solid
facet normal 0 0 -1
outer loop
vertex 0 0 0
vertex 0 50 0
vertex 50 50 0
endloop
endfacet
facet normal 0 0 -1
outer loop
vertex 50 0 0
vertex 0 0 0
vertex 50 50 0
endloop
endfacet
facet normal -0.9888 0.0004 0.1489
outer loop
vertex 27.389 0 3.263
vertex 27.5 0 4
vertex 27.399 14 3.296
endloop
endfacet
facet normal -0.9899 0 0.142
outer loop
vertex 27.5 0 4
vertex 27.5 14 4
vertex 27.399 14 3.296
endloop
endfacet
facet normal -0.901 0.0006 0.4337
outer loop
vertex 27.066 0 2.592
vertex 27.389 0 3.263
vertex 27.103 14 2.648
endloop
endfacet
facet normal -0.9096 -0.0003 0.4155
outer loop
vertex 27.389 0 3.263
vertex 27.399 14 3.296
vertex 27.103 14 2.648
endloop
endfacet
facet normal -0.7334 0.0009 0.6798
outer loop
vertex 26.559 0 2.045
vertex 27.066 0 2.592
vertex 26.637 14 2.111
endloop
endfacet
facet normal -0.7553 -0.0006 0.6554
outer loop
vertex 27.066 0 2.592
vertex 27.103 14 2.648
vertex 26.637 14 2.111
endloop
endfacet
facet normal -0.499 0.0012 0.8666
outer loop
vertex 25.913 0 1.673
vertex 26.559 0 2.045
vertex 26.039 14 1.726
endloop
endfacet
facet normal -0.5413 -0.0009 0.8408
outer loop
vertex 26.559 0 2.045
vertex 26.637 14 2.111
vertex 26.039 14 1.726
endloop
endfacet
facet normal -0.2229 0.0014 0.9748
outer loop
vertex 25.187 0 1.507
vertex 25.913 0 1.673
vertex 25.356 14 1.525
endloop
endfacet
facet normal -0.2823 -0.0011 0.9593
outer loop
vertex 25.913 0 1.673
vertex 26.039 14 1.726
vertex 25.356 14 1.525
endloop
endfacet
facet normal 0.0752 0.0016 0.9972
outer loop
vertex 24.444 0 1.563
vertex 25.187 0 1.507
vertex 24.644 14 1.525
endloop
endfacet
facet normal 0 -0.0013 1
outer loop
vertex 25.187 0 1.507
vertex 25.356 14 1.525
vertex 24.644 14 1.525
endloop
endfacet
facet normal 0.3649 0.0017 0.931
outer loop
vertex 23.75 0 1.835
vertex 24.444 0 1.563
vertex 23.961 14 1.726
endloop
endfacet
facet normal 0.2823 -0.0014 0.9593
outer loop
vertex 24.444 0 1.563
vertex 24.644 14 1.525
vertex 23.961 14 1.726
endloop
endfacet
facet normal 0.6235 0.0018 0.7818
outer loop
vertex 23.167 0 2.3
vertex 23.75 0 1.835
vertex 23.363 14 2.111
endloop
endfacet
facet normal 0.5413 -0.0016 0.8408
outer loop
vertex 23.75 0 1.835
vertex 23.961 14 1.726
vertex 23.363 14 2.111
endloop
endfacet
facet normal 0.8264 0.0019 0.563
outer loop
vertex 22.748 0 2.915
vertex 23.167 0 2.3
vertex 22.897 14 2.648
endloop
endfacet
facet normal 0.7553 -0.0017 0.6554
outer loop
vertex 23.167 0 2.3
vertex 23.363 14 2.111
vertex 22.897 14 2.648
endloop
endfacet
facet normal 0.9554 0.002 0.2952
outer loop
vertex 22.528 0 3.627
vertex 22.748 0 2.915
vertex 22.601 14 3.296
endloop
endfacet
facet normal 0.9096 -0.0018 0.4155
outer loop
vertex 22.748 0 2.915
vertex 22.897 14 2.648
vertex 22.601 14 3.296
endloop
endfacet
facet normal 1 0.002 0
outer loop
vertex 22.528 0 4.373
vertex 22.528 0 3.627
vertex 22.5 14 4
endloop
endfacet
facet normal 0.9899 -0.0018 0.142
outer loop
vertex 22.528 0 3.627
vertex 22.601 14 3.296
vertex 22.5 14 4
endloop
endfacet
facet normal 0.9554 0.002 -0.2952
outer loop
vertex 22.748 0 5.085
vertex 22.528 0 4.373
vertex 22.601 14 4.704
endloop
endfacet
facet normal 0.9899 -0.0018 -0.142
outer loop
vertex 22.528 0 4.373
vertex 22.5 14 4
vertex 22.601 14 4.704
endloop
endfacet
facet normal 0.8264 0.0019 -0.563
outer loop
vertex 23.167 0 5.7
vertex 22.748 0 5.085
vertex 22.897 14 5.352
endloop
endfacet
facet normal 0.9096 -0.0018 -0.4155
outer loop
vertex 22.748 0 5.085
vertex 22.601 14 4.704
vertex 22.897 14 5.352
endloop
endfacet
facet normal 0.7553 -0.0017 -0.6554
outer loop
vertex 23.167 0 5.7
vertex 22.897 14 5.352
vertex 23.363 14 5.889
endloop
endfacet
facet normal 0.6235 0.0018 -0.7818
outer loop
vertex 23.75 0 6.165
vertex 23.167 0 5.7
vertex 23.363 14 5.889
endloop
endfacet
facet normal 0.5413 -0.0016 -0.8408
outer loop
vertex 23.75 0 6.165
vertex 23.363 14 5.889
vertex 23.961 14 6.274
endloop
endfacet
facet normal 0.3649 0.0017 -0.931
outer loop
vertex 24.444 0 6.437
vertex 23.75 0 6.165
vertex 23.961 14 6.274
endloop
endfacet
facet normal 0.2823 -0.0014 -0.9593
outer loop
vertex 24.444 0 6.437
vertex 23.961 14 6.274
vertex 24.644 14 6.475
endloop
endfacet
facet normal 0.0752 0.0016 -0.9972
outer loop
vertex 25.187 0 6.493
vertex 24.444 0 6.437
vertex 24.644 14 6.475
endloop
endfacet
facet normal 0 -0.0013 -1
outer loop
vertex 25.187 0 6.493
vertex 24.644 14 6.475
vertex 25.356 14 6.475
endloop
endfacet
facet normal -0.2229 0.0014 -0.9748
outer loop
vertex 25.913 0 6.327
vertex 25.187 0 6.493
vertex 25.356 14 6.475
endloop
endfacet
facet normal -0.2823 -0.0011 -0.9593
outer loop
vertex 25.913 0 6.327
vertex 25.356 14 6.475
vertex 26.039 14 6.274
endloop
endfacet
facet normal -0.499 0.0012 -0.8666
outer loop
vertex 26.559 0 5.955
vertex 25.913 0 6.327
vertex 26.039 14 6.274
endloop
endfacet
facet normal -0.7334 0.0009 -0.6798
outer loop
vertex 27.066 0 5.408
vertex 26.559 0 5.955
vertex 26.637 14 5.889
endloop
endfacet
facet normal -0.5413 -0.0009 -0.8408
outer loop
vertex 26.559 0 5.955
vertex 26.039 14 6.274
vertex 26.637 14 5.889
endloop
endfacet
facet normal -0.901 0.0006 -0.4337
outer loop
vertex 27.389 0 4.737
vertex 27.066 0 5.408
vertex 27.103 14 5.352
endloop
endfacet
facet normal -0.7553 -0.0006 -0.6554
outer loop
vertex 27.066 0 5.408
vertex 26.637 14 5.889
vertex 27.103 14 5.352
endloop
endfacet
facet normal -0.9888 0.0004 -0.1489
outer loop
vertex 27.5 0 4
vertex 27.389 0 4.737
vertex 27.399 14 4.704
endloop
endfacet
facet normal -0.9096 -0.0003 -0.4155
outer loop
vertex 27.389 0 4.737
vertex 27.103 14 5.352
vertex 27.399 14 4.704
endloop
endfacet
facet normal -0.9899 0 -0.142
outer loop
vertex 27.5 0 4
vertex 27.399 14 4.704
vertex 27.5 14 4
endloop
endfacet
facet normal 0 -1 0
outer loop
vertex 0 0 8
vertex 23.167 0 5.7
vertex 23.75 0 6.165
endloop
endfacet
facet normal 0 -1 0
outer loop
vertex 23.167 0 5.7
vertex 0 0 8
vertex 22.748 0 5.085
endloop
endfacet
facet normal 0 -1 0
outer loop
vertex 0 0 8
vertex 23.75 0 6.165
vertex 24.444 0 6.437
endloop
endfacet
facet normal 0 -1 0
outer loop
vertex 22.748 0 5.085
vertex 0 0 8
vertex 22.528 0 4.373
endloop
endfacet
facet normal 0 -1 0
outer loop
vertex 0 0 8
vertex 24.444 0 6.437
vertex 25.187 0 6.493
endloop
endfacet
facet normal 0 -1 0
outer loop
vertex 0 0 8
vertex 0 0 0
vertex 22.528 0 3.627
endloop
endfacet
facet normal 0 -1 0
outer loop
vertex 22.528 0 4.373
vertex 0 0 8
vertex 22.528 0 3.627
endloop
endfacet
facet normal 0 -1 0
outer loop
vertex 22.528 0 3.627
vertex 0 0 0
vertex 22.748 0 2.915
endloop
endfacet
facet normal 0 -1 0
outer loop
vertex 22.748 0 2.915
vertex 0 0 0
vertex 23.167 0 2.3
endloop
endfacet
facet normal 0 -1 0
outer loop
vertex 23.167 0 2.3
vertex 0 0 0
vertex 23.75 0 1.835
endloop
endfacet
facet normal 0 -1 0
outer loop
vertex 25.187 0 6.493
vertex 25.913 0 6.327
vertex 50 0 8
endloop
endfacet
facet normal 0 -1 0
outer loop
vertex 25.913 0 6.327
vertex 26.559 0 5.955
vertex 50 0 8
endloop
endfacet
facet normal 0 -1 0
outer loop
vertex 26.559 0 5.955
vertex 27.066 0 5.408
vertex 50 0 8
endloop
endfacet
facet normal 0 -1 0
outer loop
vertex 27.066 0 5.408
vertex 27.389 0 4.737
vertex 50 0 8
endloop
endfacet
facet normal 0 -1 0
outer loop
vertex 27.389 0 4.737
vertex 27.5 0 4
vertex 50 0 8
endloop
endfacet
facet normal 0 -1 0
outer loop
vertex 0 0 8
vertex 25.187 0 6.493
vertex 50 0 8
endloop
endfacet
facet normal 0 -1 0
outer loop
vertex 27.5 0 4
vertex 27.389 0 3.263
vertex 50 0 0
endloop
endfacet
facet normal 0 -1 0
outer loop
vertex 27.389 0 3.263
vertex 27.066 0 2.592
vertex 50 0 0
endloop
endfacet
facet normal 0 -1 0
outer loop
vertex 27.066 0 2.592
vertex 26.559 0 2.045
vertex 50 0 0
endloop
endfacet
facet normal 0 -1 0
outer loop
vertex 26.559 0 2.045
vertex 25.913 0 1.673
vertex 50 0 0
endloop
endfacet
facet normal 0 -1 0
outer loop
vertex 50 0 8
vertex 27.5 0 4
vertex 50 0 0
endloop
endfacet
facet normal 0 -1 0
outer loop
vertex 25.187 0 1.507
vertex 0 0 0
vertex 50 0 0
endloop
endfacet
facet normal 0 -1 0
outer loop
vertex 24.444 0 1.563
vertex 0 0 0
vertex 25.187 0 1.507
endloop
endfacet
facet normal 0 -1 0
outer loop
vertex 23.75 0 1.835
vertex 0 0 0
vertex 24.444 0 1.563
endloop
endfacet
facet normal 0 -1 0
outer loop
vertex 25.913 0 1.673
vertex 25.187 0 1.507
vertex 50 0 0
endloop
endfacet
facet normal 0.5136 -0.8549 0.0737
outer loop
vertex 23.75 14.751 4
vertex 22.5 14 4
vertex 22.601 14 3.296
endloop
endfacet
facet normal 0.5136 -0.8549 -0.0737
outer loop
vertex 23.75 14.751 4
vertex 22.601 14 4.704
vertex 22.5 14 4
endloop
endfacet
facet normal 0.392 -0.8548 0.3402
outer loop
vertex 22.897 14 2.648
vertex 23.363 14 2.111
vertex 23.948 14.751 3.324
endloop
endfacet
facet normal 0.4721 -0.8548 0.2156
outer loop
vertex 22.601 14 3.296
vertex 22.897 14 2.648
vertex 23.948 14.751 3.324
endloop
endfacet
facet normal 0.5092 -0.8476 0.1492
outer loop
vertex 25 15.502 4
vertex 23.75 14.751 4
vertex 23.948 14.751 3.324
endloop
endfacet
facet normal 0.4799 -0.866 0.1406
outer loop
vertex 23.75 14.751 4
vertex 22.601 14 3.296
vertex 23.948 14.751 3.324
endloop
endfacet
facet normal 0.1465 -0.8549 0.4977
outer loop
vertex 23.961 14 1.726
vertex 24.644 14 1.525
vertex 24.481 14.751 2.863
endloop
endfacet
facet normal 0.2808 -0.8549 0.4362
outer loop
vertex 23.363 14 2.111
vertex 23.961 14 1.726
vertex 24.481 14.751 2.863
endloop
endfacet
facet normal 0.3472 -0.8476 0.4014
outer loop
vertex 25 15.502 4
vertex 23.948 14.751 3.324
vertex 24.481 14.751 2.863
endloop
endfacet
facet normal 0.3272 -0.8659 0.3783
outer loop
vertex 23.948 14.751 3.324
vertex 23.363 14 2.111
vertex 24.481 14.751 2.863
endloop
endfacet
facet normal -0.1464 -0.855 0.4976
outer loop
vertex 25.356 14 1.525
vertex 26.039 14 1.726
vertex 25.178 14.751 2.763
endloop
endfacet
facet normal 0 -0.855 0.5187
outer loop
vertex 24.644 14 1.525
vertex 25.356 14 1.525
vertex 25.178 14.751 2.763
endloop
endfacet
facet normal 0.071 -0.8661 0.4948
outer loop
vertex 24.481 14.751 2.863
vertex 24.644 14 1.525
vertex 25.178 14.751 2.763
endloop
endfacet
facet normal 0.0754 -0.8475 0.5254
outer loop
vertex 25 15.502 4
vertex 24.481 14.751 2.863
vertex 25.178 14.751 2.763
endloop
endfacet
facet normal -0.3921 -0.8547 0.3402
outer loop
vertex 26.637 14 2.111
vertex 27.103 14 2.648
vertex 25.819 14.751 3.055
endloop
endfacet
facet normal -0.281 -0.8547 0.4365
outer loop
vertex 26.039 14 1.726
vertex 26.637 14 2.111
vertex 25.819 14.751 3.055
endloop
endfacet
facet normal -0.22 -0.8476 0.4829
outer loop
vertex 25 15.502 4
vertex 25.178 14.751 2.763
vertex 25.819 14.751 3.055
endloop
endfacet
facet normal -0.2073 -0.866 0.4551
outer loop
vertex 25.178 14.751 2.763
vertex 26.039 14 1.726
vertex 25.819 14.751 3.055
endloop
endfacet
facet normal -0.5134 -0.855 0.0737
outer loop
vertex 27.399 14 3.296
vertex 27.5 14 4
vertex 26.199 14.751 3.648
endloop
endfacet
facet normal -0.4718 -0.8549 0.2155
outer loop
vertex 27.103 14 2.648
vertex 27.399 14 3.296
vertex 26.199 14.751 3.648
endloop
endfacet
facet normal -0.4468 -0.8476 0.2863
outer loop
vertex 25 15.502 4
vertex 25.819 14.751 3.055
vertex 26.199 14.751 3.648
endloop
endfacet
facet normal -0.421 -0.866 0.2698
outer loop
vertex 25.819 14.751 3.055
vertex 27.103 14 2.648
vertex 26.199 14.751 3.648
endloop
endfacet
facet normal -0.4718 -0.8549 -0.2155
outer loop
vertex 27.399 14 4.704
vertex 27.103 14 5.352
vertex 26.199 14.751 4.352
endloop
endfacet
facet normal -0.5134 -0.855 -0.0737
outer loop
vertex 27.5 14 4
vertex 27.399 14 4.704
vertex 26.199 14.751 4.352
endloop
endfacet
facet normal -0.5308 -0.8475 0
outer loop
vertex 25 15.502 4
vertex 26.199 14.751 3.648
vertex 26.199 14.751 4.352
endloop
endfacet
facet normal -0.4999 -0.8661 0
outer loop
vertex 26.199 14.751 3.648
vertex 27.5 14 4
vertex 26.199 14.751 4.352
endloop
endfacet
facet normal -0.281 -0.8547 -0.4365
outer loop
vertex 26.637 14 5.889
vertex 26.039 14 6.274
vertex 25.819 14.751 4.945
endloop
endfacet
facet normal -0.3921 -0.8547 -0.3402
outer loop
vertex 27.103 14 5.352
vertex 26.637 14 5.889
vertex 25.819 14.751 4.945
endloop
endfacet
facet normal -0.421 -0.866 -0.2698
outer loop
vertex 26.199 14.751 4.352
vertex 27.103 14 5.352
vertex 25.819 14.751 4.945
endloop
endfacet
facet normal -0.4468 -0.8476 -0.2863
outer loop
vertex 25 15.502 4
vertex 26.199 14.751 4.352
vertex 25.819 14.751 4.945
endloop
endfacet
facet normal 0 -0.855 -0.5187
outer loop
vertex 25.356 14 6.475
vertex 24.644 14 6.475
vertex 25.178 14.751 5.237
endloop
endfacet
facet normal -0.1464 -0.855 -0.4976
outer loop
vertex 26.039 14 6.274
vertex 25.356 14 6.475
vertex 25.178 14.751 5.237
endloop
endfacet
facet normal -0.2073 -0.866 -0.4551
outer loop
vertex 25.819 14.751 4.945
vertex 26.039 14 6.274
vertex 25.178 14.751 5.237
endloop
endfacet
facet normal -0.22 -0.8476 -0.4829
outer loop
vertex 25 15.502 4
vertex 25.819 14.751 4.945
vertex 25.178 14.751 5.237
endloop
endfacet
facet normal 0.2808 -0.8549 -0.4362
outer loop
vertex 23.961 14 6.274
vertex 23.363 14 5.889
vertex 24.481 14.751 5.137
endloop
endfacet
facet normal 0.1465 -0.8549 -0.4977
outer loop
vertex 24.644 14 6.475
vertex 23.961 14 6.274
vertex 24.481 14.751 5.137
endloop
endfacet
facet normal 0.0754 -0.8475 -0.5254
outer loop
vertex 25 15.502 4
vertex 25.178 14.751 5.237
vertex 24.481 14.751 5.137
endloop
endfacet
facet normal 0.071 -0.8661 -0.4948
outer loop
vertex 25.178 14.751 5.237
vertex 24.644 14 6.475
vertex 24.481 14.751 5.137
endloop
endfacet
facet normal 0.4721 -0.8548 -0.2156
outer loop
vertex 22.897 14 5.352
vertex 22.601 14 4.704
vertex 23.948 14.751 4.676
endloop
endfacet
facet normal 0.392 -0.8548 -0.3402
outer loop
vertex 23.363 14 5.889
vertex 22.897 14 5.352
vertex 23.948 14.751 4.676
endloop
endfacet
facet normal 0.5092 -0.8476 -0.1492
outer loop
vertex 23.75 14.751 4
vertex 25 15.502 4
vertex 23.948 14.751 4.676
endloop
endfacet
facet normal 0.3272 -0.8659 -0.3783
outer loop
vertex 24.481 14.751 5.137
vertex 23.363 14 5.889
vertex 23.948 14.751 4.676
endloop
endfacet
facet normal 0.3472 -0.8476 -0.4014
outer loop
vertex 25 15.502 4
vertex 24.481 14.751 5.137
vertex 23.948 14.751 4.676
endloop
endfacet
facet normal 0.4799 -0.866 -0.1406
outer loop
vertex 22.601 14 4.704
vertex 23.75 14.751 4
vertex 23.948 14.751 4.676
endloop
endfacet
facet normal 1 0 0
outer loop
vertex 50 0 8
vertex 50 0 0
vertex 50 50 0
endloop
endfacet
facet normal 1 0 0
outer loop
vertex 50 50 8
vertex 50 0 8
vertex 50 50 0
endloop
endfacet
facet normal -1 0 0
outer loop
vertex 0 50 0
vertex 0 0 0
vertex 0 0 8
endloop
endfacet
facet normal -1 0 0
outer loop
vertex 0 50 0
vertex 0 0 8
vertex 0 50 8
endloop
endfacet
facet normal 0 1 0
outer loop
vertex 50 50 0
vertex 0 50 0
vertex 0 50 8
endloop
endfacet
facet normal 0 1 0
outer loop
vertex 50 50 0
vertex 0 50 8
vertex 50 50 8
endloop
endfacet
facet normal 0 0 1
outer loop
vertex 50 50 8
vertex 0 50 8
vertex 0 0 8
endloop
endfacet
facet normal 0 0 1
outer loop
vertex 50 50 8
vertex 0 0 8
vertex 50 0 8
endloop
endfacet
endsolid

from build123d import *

# Parameters (mm, degrees)
SKETCH_1_W            = 50
SKETCH_1_H            = 50
EXTRUDE_1_DEPTH       = 8
HOLE_WIZARD_M63_D     = 5
HOLE_WIZARD_M63_DEPTH = 14
HOLE_WIZARD_M63_TIP   = 1.502151548


with BuildPart() as part:
    # Эскиз1 → Бобышка-Вытянуть1 (new body)
    with BuildSketch(Plane.XY):
        with Locations((25, 25)):
            Rectangle(SKETCH_1_W, SKETCH_1_H)
    extrude(amount=EXTRUDE_1_DEPTH)

    # Отверстие обработанное метчиком M63
    with Locations(Plane(origin=(0, 0, 0), x_dir=(-1, 0, 0), z_dir=(0, -1, 0))):
        with Locations((-25, -4)):
            Hole(HOLE_WIZARD_M63_D / 2, depth=HOLE_WIZARD_M63_DEPTH)
            with Locations((0, 0, -(HOLE_WIZARD_M63_DEPTH + HOLE_WIZARD_M63_TIP / 2))):  # 118° drill point
                Cone(0, HOLE_WIZARD_M63_D / 2, HOLE_WIZARD_M63_TIP, mode=Mode.SUBTRACT)


solid = part.part
